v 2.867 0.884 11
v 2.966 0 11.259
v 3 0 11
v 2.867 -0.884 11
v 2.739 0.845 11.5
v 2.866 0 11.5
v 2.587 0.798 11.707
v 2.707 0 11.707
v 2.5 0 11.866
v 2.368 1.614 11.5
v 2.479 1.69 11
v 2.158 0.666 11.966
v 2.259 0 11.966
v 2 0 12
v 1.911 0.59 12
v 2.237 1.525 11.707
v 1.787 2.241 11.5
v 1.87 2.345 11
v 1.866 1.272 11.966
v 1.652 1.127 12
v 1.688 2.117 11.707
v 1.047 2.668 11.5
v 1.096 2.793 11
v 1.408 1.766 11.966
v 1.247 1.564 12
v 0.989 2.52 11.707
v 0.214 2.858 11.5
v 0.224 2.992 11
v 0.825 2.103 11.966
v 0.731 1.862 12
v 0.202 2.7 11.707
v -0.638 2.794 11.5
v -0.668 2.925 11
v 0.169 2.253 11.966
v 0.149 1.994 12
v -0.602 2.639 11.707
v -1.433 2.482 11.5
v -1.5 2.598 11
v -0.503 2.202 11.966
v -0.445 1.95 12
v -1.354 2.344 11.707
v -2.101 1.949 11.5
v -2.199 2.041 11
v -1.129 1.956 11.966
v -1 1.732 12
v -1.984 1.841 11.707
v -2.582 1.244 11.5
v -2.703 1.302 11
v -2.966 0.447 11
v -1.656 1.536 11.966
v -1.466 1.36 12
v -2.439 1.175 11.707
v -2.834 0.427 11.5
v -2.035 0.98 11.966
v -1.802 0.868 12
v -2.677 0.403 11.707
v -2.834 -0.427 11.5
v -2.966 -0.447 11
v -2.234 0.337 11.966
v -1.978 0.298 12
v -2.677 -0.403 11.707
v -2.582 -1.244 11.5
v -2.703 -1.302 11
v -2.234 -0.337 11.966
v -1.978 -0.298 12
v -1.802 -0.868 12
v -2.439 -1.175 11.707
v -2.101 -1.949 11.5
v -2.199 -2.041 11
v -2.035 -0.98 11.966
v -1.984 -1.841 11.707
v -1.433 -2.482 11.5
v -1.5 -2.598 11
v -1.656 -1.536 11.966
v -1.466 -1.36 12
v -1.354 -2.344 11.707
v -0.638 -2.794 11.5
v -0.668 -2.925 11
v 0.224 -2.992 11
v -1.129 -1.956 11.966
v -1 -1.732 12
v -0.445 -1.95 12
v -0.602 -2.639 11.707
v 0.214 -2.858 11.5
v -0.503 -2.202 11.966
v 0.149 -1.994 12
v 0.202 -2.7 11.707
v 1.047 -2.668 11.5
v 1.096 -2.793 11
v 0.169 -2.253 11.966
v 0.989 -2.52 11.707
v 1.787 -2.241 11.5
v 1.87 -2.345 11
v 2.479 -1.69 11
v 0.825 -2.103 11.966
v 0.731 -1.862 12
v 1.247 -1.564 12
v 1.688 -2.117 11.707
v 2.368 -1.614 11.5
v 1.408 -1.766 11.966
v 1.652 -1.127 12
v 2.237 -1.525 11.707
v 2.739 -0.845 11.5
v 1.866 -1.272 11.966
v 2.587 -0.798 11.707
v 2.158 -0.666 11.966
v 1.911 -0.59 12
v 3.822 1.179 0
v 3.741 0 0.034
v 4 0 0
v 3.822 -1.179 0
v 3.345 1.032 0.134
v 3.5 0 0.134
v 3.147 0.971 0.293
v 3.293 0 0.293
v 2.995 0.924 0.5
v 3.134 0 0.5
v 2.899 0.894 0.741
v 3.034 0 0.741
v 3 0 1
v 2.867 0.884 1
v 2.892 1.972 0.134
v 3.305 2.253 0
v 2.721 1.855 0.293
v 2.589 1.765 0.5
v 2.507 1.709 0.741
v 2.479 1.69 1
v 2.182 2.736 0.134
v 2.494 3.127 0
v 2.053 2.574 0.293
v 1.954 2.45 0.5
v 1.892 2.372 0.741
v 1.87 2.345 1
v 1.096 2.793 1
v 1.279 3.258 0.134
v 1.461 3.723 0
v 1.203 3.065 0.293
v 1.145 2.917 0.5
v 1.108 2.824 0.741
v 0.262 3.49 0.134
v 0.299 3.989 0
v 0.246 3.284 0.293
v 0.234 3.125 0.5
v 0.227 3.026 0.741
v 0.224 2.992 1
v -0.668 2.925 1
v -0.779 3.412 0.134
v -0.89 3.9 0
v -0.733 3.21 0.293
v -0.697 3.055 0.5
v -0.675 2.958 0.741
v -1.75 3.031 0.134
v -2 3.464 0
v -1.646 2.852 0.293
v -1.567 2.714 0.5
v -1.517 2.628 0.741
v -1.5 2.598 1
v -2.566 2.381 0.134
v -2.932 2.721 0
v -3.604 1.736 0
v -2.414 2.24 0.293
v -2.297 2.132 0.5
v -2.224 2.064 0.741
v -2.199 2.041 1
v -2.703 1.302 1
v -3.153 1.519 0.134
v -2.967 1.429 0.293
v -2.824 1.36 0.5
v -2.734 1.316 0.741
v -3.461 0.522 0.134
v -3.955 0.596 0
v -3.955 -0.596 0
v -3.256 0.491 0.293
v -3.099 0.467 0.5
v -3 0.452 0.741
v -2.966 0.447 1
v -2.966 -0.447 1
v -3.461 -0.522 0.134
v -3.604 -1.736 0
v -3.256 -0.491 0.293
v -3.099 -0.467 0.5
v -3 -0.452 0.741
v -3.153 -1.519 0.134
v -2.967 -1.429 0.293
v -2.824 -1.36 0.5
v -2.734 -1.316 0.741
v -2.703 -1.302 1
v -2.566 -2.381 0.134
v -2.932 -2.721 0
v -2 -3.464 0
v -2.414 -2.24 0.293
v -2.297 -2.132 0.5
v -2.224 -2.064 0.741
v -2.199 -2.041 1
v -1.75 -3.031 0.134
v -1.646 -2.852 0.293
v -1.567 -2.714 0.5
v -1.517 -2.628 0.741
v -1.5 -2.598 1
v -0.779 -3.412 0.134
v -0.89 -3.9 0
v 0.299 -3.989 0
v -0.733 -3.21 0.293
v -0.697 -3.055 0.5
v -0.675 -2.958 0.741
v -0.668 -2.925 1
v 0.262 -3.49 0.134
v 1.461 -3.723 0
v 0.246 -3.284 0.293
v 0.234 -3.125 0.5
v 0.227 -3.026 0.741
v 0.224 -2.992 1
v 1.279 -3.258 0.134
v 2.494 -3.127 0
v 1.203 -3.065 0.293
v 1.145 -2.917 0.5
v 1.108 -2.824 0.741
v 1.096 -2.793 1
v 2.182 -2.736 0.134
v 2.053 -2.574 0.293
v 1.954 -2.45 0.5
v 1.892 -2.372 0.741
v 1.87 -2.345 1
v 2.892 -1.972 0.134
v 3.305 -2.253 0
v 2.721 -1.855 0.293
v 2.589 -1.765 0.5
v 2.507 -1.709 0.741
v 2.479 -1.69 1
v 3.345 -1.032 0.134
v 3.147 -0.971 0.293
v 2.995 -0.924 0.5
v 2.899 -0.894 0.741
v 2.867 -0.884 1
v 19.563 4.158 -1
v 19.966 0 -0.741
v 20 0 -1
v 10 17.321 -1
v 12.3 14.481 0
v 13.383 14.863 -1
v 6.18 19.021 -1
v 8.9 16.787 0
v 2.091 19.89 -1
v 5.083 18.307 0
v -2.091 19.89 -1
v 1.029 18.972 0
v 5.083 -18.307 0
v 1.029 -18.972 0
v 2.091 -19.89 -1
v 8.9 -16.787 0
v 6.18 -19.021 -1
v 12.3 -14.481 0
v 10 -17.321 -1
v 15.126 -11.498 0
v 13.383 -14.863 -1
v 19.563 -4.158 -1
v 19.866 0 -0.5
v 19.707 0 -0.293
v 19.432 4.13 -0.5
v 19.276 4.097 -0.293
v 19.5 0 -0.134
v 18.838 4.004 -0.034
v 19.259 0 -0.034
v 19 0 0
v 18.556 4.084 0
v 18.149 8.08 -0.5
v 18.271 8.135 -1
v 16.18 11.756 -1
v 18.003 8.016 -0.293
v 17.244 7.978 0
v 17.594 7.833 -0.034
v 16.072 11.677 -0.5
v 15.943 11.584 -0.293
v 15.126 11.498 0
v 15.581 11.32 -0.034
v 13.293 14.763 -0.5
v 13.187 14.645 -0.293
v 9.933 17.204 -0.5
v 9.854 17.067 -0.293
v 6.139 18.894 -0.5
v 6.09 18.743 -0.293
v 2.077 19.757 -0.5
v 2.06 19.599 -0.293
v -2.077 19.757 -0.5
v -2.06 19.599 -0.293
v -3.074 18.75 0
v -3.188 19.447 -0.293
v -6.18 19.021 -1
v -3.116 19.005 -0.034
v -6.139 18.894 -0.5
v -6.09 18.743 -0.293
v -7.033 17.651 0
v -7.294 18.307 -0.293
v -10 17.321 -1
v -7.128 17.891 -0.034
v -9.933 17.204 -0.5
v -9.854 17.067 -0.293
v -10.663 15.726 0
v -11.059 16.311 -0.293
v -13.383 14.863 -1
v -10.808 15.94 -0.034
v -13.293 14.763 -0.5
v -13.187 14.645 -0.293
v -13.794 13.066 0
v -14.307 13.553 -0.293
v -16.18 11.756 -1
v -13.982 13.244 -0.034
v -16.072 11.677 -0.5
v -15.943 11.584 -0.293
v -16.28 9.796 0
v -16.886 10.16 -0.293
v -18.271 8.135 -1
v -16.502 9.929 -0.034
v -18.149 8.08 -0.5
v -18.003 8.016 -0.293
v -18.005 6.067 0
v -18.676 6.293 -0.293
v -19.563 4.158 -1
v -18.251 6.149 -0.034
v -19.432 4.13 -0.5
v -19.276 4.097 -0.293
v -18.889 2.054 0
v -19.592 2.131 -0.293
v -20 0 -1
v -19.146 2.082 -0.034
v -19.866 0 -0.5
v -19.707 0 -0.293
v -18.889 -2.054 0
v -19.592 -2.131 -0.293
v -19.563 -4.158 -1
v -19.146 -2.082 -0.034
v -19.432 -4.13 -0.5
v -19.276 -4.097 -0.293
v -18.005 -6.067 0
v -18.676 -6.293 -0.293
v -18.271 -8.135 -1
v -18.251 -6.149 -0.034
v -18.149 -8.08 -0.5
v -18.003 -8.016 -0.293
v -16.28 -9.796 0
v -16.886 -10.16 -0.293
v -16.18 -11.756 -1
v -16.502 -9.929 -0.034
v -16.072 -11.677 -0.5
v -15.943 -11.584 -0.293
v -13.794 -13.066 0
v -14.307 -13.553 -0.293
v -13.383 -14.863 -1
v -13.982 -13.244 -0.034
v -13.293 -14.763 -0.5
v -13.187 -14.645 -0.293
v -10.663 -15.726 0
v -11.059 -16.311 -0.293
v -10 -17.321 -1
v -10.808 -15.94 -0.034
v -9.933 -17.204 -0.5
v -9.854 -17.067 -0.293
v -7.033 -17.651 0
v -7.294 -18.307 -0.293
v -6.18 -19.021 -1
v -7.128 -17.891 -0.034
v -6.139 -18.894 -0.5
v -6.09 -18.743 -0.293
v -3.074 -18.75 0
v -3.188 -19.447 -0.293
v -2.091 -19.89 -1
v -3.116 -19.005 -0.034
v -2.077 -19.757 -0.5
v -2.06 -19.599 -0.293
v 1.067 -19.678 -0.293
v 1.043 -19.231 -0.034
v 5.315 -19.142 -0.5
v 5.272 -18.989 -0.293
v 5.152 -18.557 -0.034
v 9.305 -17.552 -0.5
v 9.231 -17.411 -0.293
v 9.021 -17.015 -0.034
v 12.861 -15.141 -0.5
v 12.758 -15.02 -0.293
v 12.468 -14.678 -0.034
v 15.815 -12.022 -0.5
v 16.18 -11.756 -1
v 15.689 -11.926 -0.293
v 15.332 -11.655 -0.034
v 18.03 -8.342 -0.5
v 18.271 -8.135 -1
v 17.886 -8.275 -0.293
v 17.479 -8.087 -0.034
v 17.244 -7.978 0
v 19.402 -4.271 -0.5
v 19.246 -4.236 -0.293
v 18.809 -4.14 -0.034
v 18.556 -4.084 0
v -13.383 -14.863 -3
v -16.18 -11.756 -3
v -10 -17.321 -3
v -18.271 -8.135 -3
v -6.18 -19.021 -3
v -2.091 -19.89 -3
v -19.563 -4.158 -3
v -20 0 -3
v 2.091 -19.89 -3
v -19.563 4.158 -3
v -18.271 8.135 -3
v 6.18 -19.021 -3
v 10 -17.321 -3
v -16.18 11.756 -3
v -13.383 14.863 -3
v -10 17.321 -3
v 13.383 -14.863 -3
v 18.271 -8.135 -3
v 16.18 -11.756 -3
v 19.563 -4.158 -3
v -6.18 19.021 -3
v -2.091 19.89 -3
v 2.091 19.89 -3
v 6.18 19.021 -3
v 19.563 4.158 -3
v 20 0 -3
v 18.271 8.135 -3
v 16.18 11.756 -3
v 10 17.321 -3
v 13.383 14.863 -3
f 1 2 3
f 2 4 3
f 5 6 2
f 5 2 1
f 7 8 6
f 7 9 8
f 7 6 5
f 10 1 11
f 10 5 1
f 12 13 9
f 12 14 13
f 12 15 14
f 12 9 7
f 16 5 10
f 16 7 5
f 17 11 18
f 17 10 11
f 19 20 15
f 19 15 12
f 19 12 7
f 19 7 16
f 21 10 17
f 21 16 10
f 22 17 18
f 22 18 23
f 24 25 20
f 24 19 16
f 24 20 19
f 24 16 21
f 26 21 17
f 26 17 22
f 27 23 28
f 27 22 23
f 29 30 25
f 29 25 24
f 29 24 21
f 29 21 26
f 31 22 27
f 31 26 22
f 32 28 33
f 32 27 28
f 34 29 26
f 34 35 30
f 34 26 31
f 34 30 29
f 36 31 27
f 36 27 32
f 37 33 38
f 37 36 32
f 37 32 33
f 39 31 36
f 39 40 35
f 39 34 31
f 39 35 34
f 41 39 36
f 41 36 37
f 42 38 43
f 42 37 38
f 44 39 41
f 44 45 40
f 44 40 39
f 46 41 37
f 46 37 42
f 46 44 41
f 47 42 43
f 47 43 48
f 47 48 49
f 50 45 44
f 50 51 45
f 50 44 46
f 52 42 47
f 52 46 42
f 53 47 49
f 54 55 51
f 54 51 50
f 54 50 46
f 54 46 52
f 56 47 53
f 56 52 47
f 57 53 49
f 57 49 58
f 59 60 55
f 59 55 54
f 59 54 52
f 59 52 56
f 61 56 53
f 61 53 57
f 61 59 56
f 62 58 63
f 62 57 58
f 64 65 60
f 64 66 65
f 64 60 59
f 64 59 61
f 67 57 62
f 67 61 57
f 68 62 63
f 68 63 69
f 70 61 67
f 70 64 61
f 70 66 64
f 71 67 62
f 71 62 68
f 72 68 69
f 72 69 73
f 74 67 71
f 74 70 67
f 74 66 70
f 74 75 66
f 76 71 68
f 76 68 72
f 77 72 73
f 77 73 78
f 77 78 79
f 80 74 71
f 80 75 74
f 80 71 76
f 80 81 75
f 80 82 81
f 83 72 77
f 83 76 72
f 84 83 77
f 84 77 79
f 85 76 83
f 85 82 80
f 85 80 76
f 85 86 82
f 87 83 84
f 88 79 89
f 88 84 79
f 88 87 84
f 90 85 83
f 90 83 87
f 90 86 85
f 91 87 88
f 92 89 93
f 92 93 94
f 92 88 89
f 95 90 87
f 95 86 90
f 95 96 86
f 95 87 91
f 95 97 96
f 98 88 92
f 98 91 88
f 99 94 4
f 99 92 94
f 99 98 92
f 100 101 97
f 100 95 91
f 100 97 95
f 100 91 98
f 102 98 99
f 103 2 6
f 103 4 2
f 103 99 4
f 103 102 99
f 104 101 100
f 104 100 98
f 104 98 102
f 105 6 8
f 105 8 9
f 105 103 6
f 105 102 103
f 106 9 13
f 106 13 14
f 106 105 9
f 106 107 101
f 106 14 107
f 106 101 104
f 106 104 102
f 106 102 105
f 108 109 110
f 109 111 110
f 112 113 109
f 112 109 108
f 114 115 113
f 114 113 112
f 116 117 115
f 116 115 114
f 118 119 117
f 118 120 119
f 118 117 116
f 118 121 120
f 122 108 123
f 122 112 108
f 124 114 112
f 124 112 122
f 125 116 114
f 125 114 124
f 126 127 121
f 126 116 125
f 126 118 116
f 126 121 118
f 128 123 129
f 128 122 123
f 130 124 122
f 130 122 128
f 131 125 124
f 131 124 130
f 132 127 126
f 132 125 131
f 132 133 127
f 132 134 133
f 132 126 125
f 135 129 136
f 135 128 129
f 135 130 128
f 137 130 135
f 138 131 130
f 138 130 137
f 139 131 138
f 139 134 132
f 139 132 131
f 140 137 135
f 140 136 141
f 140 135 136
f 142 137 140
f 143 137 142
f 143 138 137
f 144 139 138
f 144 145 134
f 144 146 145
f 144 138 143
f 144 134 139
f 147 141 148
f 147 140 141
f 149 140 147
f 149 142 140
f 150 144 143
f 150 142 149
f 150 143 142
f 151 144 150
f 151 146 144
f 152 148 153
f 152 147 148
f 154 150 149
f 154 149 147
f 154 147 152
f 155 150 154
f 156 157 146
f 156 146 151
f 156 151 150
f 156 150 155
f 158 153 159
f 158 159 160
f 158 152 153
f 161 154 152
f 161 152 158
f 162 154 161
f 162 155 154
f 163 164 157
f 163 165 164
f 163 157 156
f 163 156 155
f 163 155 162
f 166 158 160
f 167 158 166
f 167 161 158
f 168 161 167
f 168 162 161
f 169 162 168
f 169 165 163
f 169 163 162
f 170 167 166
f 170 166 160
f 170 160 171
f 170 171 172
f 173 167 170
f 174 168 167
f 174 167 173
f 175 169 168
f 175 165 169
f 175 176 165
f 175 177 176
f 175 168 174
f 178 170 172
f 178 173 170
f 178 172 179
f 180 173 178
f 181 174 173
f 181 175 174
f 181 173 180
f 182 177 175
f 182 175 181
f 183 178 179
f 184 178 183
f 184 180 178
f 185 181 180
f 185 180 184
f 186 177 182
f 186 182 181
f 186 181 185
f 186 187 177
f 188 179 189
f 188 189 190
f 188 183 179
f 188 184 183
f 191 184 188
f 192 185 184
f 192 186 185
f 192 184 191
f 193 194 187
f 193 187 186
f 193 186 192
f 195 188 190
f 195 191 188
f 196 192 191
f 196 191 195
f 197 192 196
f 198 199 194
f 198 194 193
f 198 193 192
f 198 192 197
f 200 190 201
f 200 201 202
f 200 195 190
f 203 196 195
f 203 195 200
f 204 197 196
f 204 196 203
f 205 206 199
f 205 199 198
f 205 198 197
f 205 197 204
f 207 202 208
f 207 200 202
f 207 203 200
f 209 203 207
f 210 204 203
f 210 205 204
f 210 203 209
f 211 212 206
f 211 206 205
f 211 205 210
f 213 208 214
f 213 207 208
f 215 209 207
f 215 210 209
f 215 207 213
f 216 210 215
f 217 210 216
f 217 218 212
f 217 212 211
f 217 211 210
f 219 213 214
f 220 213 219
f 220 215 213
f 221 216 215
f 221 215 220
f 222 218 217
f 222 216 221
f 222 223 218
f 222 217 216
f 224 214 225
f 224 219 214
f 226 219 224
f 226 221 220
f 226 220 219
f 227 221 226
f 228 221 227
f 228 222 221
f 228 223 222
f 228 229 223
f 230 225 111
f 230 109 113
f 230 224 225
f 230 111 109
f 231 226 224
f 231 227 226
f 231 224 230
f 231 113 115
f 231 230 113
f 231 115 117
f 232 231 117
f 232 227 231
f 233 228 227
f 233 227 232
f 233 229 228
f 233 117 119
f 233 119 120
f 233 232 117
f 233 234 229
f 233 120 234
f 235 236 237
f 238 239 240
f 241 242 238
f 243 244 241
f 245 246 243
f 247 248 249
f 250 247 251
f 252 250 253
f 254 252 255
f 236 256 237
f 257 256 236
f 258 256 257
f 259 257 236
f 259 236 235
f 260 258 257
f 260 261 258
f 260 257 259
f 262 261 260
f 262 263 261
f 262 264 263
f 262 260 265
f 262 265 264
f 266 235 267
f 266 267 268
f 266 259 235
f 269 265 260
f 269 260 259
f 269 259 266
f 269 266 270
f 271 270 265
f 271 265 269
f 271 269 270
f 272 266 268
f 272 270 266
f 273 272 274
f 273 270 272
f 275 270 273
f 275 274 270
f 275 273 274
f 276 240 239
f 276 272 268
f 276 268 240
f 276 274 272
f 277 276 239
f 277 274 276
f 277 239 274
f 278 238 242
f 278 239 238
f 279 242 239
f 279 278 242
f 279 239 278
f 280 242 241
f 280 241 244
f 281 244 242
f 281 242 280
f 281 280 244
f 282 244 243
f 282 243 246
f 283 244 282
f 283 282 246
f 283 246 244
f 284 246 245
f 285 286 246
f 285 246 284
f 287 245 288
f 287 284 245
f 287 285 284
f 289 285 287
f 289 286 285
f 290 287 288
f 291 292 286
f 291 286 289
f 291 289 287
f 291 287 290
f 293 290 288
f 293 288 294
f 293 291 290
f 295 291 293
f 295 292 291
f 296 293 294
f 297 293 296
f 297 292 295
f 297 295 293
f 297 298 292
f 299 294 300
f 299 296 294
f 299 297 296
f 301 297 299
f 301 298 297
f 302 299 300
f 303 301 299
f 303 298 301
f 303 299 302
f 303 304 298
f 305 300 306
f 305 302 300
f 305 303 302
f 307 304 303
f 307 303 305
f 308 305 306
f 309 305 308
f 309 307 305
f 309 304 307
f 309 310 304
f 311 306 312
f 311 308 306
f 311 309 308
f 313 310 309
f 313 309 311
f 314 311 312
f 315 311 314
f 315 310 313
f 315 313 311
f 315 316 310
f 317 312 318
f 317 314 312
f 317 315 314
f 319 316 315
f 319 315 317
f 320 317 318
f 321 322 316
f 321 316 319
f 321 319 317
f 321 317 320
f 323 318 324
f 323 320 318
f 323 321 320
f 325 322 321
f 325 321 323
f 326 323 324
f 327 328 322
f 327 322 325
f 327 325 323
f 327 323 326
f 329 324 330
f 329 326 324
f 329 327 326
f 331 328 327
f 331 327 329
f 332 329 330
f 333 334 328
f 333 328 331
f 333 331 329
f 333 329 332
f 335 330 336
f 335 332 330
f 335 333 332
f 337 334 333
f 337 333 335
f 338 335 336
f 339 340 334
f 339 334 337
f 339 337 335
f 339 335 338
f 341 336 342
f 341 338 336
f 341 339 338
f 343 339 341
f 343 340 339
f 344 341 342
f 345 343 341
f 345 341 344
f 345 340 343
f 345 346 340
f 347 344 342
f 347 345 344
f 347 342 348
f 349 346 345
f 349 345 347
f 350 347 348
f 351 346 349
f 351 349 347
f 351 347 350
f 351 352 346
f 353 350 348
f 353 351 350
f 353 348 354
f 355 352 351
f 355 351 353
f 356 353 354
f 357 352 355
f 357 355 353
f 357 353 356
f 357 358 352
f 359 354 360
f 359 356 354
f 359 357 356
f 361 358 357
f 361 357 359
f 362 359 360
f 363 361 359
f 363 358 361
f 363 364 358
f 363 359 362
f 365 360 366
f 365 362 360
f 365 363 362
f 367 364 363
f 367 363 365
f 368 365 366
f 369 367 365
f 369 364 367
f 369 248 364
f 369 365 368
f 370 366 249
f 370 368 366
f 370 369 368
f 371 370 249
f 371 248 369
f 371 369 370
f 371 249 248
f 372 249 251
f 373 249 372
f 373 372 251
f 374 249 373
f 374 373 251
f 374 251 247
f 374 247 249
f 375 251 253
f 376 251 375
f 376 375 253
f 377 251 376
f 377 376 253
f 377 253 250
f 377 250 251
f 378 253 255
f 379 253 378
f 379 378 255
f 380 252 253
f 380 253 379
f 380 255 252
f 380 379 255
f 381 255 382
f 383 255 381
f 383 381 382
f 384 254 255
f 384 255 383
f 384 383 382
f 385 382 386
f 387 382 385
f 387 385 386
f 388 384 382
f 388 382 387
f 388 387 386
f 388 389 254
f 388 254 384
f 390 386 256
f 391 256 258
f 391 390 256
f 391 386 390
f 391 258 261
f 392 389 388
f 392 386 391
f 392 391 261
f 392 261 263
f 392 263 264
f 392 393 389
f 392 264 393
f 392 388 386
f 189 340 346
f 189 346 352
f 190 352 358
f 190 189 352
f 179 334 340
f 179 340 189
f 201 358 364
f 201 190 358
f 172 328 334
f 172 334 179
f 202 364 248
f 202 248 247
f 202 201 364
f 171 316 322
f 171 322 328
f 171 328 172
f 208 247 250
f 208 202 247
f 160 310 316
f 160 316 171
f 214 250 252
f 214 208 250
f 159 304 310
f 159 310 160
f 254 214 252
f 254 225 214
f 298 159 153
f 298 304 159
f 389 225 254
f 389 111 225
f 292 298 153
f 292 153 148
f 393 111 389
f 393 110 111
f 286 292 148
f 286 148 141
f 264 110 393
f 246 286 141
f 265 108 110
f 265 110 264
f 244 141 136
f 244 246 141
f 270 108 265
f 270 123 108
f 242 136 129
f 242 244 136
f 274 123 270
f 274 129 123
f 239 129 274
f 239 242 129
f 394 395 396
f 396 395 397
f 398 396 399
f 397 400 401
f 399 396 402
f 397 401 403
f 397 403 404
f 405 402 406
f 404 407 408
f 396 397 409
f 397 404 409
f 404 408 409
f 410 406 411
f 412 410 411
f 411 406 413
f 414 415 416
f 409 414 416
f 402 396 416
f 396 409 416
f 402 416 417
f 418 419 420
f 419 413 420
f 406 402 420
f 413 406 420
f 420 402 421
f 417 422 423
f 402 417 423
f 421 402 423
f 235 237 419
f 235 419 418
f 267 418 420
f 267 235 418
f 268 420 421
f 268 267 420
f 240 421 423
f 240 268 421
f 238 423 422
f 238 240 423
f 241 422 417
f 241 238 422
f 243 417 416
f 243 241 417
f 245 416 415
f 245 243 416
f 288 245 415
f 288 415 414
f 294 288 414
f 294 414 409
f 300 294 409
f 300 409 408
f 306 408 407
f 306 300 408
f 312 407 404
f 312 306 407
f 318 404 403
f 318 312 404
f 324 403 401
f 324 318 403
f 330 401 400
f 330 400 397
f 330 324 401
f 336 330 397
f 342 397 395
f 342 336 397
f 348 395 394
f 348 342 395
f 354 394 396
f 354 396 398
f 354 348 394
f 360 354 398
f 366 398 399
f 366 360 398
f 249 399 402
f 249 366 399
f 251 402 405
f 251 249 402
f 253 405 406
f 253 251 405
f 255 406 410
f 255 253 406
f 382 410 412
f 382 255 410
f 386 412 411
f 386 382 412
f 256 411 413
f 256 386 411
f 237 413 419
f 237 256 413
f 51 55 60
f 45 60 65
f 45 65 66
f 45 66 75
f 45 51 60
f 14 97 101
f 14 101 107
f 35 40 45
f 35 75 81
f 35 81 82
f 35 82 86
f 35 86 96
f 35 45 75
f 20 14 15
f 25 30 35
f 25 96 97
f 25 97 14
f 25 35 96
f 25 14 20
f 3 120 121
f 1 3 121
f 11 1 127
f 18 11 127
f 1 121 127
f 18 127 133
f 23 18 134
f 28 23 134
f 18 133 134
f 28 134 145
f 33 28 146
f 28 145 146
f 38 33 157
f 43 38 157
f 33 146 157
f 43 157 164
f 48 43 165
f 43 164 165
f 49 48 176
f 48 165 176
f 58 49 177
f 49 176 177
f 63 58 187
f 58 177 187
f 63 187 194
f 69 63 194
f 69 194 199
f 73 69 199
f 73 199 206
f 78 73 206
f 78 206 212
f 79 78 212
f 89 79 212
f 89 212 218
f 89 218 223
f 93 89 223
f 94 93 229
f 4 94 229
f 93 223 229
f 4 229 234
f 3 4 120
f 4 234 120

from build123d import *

# Parameters (mm, degrees)
F0_R     = 20
F1_DEPTH = 3
F2_R     = 3
F3_DEPTH = 12
F4_R     = 1


with BuildPart() as f1:
    # F0 (on Top) → F1 (new body)
    with BuildSketch(Plane.XY):
        Circle(F0_R)
    extrude(amount=-F1_DEPTH)

    # F2 (on face) → F3 (join)
    with BuildSketch(Plane.XY):
        Circle(F2_R)
    extrude(amount=F3_DEPTH)

    # F4
    f4_edges = [f1.edges().sort_by_distance(p)[0] for p in [
        (-20, 0, 0),
        (-3, 0, 12),
        (-3, 0, 0),
    ]]
    fillet(f4_edges, radius=F4_R)


solid = f1.part
